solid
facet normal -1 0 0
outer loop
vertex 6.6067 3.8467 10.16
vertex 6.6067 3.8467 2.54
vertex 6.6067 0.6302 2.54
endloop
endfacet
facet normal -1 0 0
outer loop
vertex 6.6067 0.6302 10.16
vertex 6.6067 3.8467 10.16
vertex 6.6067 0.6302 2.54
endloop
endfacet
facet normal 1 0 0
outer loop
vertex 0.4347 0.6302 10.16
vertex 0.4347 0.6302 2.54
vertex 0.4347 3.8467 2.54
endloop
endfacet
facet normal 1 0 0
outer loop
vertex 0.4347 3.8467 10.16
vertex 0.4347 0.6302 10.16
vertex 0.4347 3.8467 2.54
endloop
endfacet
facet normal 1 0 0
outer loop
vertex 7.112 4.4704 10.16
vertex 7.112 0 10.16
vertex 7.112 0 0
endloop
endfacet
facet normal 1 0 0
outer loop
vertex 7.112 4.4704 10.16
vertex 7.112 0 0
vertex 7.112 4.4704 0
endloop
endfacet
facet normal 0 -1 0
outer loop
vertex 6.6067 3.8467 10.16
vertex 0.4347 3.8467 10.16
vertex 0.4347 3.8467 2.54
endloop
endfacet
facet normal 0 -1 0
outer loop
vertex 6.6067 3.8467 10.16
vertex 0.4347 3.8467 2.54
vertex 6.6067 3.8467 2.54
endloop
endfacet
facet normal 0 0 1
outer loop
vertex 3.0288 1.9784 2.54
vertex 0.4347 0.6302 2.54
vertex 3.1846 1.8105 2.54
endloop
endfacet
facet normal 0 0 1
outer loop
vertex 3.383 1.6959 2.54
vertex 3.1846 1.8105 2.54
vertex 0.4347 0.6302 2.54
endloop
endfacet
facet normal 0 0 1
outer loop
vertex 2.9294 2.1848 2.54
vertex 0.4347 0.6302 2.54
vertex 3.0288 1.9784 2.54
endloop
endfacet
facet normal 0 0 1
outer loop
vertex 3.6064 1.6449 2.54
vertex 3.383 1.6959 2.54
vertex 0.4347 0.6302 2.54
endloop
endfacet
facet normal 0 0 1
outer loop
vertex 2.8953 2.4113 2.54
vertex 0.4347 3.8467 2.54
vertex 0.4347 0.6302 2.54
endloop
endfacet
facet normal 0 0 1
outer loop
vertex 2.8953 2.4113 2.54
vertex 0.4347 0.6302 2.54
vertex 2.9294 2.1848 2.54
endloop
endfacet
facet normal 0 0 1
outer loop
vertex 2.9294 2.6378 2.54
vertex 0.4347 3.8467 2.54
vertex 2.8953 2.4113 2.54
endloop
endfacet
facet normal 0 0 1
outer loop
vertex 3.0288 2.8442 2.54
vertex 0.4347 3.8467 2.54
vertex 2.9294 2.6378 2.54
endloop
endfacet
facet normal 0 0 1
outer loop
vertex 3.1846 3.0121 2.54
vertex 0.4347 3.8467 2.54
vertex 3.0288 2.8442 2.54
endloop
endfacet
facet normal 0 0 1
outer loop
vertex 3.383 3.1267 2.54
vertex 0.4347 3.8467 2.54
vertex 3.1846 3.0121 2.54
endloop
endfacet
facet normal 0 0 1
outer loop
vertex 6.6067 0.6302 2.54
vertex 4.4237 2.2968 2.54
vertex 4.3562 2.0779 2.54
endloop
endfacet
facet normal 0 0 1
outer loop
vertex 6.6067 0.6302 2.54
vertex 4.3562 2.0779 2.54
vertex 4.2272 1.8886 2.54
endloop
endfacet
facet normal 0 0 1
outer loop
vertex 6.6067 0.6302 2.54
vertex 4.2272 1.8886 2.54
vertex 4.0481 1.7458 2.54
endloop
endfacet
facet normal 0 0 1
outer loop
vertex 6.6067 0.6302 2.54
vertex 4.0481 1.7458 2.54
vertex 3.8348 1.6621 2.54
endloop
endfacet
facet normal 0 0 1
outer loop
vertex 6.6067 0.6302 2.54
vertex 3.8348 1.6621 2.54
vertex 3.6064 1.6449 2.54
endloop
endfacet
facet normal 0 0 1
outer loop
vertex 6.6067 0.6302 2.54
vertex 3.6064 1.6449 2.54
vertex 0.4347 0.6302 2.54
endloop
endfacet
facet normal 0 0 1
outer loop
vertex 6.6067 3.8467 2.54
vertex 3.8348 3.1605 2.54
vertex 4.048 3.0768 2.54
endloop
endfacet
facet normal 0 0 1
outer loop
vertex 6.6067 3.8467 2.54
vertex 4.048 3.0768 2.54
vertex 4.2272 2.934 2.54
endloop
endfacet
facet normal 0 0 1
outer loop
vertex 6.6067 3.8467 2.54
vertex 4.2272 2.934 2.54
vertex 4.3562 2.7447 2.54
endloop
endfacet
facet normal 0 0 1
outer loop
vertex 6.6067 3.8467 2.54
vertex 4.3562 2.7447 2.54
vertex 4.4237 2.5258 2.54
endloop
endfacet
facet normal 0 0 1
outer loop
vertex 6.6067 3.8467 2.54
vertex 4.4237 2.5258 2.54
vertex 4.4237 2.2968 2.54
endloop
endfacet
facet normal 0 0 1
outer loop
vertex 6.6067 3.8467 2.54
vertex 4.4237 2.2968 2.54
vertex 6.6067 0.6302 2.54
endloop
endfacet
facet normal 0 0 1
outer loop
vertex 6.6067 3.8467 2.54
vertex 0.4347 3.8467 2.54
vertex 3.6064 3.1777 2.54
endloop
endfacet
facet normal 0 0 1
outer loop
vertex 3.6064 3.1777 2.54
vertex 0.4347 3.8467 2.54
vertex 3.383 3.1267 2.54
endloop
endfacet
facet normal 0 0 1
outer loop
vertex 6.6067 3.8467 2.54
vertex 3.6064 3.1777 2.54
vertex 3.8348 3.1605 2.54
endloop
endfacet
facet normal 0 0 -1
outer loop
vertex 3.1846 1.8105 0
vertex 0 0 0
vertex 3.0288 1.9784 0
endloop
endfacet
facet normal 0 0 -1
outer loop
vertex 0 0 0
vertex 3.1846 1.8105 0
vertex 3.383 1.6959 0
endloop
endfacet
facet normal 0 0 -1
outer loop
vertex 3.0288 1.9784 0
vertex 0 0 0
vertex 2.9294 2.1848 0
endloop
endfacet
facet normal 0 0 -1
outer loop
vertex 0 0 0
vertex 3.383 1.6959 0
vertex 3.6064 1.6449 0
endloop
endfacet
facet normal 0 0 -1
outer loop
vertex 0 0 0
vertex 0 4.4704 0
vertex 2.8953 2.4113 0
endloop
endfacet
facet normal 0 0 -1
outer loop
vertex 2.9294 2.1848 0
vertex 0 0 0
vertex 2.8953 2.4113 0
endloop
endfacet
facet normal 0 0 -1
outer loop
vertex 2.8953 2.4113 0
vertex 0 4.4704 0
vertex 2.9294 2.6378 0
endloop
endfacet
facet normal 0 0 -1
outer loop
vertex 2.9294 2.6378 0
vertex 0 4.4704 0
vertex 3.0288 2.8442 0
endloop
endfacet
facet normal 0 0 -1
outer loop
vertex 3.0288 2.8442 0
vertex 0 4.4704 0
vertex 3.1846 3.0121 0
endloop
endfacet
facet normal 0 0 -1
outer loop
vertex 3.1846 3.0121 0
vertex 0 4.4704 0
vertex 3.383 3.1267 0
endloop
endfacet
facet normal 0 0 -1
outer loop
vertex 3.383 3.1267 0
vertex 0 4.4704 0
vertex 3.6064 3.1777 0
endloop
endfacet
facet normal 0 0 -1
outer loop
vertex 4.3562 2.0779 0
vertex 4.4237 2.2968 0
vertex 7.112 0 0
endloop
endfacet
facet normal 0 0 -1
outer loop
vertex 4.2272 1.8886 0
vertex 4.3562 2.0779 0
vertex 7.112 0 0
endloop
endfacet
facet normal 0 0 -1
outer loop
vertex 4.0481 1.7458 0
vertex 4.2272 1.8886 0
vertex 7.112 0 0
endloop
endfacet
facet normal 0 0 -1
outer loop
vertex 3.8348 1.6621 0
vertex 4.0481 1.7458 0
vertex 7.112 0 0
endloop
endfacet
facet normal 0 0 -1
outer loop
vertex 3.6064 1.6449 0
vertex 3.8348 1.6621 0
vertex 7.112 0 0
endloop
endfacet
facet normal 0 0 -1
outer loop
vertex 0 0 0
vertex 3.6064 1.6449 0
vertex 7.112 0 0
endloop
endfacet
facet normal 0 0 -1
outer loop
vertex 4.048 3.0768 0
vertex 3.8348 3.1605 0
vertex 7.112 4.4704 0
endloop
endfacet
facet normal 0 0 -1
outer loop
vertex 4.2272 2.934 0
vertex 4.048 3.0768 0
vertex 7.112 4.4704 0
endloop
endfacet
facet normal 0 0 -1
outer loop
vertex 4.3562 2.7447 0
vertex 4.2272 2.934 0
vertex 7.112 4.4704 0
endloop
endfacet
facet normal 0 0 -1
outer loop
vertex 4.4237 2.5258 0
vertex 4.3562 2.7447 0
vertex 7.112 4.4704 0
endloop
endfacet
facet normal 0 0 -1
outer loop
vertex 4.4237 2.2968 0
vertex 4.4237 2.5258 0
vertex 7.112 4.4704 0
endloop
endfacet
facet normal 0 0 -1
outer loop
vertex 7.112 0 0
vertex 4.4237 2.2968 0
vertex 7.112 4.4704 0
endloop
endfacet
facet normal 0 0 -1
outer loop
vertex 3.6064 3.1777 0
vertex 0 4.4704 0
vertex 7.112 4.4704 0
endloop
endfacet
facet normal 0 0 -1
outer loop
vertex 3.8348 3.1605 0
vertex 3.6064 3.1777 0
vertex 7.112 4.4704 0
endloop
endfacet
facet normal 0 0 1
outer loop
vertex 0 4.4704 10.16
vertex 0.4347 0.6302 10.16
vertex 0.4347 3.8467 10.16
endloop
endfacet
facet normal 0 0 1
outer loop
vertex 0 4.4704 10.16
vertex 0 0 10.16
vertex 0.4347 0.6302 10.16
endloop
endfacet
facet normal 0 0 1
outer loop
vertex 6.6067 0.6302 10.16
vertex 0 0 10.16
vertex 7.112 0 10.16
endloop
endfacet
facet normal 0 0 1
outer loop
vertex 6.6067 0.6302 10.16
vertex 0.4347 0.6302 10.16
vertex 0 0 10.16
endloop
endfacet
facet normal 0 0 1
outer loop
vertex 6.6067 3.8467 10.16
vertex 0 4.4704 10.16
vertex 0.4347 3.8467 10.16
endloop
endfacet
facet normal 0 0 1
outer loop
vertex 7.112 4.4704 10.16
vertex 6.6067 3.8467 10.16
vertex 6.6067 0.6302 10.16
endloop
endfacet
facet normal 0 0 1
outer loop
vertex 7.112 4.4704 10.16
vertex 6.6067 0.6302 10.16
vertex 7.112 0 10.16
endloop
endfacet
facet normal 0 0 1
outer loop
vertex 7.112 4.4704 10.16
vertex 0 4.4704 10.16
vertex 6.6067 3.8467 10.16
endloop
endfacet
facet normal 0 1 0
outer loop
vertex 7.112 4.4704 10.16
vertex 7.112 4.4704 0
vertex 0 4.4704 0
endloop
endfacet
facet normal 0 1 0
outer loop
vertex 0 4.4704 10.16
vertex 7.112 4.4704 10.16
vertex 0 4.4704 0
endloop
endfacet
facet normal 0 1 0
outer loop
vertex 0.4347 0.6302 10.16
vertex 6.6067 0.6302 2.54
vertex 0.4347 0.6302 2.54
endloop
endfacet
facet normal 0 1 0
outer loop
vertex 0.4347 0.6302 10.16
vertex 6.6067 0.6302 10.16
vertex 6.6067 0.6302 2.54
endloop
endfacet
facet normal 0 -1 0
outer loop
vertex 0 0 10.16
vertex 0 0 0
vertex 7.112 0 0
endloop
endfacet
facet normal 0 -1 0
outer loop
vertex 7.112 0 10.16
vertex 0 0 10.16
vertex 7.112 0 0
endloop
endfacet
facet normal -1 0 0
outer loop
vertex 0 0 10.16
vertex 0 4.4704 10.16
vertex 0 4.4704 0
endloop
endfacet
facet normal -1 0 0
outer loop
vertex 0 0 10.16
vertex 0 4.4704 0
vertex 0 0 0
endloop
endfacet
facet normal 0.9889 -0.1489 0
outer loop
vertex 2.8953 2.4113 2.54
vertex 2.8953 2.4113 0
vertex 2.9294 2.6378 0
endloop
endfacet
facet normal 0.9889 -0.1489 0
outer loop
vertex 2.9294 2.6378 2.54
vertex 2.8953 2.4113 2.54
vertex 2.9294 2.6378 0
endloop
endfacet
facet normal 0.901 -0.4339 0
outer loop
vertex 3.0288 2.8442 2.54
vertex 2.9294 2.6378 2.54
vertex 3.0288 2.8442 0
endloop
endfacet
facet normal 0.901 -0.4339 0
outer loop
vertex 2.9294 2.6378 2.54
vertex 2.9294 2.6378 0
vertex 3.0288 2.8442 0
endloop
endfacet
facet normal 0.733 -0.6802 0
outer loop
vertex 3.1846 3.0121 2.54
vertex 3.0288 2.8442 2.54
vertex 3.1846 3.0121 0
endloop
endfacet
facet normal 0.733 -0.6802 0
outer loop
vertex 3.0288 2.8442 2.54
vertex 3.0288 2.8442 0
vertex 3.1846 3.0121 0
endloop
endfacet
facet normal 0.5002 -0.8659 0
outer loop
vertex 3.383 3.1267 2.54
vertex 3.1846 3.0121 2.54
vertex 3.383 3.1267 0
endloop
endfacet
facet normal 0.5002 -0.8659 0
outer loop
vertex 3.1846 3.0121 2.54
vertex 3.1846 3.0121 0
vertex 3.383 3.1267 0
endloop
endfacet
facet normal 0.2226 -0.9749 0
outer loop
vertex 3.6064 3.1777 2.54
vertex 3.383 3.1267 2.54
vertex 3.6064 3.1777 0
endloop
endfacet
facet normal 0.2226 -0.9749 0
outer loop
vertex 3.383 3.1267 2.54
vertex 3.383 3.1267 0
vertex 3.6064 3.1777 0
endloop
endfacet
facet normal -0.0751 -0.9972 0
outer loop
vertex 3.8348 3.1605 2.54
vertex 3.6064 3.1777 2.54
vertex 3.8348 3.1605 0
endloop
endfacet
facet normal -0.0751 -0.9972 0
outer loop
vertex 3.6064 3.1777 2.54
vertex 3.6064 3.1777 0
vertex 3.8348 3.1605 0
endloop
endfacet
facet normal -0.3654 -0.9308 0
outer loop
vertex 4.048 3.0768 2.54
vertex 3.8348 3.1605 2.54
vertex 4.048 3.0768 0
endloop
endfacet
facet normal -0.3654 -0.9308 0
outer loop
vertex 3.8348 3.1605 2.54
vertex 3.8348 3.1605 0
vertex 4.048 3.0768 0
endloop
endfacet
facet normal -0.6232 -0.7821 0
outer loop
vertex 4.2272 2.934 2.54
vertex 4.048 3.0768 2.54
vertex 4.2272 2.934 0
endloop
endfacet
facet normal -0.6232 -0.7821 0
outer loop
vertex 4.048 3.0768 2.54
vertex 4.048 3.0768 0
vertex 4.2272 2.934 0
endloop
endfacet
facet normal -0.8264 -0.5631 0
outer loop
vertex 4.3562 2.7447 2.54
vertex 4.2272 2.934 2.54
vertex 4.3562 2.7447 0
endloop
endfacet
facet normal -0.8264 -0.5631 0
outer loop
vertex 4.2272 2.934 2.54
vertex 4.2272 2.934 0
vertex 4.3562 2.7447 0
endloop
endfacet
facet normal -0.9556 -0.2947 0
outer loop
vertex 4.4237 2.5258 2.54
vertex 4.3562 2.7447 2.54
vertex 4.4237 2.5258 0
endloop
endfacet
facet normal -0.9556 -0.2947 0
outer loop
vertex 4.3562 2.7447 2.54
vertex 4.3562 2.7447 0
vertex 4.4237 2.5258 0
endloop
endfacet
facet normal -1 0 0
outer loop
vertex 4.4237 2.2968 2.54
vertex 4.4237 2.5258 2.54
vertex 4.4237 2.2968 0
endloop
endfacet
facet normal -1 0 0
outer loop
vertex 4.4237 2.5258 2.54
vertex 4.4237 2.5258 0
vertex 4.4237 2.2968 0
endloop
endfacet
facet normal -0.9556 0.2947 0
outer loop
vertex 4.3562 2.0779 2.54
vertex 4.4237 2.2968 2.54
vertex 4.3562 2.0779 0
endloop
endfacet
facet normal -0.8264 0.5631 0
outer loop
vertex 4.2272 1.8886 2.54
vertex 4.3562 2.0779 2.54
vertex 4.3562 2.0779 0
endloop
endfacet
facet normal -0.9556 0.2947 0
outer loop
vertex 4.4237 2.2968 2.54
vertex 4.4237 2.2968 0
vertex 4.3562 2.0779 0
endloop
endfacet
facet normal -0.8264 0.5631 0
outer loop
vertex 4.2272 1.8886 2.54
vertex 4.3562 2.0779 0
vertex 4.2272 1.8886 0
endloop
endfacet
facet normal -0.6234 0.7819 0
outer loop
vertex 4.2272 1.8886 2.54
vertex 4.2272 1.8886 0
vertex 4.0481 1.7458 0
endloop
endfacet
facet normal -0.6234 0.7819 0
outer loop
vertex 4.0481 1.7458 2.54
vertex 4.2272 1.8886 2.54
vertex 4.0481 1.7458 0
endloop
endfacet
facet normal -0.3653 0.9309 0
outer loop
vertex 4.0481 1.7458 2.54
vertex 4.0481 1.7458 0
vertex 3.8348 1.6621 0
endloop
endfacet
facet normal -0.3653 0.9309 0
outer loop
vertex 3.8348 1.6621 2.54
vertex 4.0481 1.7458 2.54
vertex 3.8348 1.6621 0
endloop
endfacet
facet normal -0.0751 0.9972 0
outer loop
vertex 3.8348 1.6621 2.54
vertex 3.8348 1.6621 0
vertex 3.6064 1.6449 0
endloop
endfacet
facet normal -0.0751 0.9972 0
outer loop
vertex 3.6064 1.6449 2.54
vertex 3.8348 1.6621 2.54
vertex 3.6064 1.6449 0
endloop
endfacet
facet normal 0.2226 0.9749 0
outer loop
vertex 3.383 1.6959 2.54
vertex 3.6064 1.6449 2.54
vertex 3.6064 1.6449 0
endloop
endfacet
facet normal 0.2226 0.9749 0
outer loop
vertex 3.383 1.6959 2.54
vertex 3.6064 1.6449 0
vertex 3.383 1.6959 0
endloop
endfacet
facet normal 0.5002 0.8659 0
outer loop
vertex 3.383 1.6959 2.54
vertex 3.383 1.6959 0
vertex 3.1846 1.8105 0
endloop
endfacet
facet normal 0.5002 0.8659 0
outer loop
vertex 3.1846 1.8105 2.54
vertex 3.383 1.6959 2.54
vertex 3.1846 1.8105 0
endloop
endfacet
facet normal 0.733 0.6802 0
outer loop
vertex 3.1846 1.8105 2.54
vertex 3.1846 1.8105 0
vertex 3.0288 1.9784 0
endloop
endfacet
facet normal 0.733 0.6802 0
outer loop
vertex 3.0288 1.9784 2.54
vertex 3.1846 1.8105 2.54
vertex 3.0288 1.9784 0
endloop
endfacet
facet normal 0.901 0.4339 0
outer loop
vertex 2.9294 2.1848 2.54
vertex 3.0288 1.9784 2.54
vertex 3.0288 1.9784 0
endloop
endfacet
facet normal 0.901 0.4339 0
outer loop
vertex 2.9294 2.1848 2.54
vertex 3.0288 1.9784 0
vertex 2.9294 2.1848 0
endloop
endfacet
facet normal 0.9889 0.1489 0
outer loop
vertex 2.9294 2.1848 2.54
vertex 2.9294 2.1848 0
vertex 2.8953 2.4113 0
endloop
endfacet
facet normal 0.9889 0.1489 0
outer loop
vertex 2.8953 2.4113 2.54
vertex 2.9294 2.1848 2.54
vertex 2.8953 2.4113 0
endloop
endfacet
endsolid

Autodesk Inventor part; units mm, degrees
ref_plane "YZ Plane" through (0, 0, 0) normal (1, 0, 0) x (0, 1, 0)
ref_plane "XZ Plane" through (0, 0, 0) normal (0, 1, 0) x (-1, 0, 0)
ref_plane "XY Plane" through (0, 0, 0) normal (0, 0, 1) x (1, 0, 0)
sketch "Sketch1" plane through (0, 0, 0) normal (0, 0, 1) x (1, 0, 0)
  point P0 (0, 0)
sketch "Sketch2" plane through (0, 0, 0) normal (0, 0, 1) x (1, 0, 0)
  point P0 (0, 0)
sketch "Sketch3" plane through (0, 0, 0) normal (0, 0, 1) x (1, 0, 0)
  line L0 (0, 0) -> (7.112, 0)
  line L1 (7.112, 0) -> (7.112, 4.4704)
  line L2 (7.112, 4.4704) -> (0, 4.4704)
  line L3 (0, 4.4704) -> (0, 0)
  dimension "d0" = 7.112
  dimension "d1" = 4.4704
extrude "Extrusion1" add sketch "Sketch3" along normal blind 10.16
sketch "Sketch4" plane through (0, 0, 10.16) normal (0, 0, 1) x (1, 0, 0)
  line L0 (0.4347, 3.8467) -> (6.6067, 3.8467)
  line L1 (6.6067, 3.8467) -> (6.6067, 0.6302)
  line L2 (6.6067, 0.6302) -> (0.4347, 0.6302)
  line L3 (0.4347, 0.6302) -> (0.4347, 3.8467)
  point P0 (0, 0)
extrude "Extrusion2" cut sketch "Sketch4" against normal blind 7.62
sketch "Sketch5" plane through (0, 0, 0) normal (0, 0, -1) x (-1, 0, 0)
  circle A0 centre (-3.6638, 2.4113) radius 0.7685
  point P0 (0, 0)
extrude "Extrusion3" cut sketch "Sketch5" against normal blind 2.54
properties part number "dc motor"
